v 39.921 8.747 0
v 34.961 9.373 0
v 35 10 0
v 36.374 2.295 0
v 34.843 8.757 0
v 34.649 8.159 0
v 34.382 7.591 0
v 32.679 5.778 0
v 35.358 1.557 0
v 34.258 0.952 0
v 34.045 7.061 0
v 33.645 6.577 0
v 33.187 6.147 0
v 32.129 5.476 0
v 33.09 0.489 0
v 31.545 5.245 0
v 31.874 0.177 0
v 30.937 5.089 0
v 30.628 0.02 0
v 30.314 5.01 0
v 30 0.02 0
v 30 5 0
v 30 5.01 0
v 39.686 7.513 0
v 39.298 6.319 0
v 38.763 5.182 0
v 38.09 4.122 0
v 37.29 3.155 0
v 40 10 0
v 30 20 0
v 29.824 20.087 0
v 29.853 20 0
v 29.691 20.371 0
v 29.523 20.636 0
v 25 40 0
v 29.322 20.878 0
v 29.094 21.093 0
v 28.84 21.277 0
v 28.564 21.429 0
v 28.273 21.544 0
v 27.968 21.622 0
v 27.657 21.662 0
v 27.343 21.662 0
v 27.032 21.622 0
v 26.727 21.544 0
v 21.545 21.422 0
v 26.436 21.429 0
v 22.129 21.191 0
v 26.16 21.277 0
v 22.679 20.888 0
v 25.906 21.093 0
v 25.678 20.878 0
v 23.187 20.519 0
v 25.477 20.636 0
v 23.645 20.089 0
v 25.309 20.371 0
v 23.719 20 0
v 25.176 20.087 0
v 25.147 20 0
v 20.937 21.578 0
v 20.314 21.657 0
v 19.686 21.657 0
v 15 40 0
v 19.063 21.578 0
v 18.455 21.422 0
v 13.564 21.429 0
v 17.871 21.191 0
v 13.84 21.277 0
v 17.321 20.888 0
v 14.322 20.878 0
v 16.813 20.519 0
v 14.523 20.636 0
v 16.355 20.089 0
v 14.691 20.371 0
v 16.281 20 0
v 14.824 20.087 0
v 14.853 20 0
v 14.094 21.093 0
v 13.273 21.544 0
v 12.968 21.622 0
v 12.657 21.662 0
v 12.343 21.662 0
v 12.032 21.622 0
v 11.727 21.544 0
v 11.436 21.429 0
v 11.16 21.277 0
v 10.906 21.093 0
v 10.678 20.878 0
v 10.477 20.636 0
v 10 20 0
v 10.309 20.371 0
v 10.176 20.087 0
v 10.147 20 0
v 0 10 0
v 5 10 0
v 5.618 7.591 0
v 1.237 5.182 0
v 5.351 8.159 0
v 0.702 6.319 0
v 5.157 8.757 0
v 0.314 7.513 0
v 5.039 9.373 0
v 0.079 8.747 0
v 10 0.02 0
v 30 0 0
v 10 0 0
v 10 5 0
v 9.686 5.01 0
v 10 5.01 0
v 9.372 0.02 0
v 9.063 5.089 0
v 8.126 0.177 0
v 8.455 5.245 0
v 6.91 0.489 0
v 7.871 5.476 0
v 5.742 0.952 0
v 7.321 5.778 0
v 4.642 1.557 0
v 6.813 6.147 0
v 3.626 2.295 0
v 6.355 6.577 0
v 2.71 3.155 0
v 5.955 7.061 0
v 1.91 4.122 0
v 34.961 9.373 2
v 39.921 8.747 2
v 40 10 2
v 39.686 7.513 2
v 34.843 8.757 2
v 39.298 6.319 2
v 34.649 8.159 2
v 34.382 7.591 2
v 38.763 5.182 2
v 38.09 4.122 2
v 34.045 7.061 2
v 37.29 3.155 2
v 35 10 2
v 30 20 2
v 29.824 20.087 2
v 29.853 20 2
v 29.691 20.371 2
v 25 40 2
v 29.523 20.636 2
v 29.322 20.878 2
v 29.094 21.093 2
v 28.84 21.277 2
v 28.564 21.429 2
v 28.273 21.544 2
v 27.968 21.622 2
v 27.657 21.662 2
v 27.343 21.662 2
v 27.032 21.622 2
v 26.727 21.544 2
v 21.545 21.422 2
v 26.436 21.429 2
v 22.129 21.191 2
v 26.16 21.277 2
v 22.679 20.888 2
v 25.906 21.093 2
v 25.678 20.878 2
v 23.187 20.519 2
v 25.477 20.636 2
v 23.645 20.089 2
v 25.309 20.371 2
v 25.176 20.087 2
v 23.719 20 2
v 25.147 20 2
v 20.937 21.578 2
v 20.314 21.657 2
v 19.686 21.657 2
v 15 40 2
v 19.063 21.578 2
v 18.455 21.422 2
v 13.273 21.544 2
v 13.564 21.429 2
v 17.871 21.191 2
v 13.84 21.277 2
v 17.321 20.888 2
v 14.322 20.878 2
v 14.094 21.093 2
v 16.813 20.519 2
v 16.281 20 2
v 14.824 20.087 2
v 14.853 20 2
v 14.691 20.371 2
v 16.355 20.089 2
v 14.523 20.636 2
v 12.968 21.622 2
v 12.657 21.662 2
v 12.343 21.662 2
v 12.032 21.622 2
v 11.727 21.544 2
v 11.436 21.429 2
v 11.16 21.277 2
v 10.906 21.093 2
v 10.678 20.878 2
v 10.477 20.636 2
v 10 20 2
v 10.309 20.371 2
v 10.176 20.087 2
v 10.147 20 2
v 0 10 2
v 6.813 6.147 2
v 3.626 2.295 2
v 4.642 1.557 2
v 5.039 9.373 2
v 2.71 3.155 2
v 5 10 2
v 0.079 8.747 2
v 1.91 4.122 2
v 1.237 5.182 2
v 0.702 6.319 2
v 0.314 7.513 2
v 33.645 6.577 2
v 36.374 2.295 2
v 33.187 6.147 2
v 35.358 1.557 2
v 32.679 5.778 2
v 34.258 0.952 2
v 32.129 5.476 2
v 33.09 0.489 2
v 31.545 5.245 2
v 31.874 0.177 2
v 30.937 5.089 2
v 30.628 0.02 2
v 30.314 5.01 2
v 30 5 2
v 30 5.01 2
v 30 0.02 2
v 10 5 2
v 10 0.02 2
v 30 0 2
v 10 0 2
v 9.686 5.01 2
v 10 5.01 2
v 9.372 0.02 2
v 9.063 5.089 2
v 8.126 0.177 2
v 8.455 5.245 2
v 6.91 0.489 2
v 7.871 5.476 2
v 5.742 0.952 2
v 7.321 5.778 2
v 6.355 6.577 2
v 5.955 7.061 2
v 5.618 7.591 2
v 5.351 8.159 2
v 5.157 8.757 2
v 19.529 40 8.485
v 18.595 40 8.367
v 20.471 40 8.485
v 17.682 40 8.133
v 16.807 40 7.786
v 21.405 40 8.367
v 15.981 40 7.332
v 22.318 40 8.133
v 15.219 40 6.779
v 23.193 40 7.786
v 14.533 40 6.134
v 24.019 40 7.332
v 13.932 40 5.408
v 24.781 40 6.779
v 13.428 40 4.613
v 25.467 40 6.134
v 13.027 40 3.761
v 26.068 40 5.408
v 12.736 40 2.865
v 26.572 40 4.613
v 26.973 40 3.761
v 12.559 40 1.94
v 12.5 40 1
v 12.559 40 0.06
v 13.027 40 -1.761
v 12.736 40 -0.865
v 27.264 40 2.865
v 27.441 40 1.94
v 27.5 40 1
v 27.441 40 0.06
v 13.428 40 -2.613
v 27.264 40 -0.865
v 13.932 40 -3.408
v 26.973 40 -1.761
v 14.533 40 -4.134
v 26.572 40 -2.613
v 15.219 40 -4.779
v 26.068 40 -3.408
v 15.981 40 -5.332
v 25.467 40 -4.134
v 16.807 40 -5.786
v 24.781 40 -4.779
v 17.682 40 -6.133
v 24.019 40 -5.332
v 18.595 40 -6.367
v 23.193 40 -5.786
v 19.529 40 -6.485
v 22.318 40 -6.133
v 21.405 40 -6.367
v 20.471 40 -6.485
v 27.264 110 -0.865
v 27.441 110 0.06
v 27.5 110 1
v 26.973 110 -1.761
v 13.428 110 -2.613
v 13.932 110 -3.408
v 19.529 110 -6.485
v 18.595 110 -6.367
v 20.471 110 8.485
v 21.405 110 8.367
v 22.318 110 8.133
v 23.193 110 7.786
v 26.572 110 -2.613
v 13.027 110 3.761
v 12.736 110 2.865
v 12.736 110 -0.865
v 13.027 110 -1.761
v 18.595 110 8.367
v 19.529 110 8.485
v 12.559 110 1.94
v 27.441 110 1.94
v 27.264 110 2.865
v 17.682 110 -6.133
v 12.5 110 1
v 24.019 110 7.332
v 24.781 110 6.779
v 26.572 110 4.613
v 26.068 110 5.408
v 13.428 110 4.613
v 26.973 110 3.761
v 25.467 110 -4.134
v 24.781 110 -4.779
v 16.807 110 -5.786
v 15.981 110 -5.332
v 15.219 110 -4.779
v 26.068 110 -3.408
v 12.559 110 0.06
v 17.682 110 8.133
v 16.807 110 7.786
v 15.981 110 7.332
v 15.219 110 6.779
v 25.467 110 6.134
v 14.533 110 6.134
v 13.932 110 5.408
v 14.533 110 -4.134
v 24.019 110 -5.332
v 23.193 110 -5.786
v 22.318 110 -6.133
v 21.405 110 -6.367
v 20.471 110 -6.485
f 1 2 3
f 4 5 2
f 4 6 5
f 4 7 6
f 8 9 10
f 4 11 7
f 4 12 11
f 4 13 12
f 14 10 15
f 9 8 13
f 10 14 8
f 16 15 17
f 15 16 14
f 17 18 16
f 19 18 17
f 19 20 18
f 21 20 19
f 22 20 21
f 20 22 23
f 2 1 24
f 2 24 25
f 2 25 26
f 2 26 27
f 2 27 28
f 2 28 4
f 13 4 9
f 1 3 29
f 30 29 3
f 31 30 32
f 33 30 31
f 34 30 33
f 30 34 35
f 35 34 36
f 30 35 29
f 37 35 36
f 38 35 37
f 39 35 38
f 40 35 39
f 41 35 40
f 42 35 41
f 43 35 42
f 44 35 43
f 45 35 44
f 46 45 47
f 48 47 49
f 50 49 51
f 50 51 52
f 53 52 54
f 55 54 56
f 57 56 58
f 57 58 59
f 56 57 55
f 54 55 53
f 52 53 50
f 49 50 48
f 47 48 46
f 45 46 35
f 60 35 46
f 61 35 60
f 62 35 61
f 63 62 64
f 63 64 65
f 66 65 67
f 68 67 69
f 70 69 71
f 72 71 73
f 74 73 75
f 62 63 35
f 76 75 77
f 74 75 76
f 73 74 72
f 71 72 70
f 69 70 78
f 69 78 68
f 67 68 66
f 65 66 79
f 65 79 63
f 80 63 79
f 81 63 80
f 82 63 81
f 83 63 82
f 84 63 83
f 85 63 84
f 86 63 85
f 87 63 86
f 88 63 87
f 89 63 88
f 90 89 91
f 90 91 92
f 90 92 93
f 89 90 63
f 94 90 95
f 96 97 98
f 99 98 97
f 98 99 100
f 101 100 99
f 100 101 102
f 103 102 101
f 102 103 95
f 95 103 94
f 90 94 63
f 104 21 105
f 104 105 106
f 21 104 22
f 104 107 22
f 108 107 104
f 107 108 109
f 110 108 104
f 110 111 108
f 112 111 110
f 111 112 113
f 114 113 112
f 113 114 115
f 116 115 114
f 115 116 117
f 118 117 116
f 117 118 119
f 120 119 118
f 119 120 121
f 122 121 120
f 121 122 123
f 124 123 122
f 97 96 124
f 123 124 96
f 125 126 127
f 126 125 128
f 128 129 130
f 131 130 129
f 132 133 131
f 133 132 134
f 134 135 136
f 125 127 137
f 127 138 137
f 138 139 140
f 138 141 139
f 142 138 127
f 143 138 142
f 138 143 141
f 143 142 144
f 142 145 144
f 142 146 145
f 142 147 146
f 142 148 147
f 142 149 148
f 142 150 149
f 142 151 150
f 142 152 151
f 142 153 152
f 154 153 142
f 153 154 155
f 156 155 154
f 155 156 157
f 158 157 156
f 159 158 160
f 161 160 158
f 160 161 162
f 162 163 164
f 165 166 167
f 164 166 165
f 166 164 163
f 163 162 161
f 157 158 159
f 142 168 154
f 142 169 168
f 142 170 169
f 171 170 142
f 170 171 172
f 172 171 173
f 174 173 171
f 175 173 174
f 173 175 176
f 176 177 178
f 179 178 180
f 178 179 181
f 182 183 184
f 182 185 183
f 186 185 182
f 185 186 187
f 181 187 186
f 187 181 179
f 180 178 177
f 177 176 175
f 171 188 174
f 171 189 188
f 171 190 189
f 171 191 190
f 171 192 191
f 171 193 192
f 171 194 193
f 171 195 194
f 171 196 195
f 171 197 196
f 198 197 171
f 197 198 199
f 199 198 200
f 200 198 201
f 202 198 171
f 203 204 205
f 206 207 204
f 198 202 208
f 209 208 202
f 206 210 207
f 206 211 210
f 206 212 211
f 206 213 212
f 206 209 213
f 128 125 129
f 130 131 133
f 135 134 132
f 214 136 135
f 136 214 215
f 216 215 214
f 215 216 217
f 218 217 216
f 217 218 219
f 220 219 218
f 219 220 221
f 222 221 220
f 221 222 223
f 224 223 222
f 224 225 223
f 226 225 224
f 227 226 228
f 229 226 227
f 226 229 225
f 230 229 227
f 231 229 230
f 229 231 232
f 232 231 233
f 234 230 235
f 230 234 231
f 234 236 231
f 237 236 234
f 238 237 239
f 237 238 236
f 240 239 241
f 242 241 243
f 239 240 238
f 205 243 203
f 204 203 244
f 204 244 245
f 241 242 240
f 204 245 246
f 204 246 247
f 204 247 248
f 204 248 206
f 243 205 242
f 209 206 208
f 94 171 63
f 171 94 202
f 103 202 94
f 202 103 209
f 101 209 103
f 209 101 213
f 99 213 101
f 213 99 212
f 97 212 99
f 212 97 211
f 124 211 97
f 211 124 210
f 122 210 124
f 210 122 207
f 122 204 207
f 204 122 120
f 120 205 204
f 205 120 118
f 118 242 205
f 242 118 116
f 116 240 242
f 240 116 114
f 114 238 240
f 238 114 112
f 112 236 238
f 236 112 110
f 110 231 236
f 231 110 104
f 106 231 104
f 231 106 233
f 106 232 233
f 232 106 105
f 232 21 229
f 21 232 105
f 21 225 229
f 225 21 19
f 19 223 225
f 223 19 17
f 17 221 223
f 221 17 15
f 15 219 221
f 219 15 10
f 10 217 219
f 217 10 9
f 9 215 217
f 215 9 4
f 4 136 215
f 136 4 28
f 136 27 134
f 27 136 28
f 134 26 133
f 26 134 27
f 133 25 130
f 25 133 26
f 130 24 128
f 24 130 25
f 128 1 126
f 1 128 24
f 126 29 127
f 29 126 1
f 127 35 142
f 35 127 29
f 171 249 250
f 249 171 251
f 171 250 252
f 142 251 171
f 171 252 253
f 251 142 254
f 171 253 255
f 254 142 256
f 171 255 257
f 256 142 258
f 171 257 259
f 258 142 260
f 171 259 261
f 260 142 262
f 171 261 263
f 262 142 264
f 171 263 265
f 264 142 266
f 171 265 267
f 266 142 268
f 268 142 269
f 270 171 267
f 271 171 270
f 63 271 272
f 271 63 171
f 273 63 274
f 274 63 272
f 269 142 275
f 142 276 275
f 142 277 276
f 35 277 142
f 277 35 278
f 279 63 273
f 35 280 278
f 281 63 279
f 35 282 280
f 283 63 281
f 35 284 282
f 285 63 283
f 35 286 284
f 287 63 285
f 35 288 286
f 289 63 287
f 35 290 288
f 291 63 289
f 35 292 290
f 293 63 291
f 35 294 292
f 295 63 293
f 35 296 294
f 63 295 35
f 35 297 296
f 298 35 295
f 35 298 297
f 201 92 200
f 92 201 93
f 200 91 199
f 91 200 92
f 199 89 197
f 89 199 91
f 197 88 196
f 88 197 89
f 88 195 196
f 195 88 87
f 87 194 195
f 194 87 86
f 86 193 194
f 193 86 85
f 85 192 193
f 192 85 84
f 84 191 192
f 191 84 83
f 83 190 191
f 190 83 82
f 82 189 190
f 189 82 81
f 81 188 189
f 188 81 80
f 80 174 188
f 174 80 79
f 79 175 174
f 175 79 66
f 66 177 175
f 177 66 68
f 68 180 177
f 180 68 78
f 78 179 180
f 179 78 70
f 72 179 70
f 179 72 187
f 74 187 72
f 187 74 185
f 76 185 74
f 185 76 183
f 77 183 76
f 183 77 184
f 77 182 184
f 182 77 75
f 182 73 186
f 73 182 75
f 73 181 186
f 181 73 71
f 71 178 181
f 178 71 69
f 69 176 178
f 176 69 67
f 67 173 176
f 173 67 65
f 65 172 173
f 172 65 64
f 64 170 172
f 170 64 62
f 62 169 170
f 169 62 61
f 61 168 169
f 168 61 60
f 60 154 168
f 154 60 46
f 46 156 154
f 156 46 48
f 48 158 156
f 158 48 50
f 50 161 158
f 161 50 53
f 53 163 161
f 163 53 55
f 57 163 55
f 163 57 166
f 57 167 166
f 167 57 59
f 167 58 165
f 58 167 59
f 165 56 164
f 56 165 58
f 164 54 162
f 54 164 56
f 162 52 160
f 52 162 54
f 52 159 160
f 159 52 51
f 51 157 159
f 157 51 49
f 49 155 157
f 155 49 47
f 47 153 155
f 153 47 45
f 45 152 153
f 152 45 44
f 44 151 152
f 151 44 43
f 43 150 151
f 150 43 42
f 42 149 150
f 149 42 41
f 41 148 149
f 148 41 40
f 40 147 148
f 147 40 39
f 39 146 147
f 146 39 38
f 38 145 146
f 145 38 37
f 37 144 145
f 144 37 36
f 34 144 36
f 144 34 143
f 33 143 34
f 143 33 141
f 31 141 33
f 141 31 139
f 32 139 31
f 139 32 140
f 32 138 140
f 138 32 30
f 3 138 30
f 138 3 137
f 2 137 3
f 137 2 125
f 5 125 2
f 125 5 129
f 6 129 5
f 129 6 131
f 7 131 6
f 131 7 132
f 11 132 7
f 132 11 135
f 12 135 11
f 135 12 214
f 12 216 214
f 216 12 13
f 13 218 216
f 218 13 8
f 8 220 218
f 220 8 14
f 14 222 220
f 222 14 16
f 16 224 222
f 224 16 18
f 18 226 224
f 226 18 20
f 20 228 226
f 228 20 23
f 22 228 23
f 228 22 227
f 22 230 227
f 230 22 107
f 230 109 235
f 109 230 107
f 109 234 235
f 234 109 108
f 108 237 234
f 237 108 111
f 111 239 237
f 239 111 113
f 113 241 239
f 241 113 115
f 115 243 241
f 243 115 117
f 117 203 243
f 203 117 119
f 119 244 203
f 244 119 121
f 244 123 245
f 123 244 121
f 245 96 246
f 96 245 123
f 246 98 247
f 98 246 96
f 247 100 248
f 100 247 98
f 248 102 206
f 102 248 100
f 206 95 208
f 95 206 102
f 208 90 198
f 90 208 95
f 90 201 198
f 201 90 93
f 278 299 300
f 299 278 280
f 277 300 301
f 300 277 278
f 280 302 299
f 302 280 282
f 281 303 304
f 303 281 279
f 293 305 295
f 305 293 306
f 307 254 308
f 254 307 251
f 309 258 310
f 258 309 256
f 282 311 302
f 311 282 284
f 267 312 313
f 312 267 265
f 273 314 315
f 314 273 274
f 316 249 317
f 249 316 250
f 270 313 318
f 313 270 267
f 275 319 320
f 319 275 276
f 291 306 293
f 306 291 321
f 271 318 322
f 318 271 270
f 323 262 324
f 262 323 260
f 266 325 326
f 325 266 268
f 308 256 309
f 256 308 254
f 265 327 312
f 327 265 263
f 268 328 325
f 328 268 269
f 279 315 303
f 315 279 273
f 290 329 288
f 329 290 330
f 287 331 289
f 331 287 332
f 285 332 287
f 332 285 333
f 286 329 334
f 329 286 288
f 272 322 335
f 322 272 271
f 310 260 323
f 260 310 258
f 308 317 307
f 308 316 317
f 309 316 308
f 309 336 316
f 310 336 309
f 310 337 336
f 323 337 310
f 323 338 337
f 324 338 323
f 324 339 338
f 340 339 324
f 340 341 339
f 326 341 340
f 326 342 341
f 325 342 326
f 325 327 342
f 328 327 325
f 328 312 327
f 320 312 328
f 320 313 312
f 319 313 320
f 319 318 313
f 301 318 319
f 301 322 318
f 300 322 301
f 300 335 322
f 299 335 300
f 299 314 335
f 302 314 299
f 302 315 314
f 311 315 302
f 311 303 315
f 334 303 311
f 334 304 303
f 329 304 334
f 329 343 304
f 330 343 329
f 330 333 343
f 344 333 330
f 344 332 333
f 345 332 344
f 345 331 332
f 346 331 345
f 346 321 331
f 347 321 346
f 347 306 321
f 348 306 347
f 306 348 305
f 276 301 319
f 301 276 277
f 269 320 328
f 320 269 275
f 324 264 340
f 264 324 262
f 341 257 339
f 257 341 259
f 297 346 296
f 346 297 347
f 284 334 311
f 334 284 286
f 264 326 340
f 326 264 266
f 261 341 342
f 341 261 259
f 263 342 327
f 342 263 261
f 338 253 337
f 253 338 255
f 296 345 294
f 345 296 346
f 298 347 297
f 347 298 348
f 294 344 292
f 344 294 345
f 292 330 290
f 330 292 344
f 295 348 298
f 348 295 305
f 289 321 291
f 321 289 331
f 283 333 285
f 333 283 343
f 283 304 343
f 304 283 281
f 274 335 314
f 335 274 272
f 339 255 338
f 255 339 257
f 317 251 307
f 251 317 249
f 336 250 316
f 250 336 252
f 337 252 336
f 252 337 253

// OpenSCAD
// Set the total width of the bottle opener
width = 40; //[30:50]
// Set the height of the opening
openingHeight = 15; //[5:30]
// Set the width of the openers frame
frameWidth = 5; //[3:10]
// Set the thickness of the frame of the opener
thickness = 2; //[2:10]
// Set the height of the neck of the opener
neckHeight = 20; //[15:30]
// Set the width of the neck of the opener
neckWidth = 10; //[5:15]
// Set the radius of the small cavity
smallPinCircle = 2.5; // 
// Set the height of the small cavity
smallPinLoc = 3; // 
// Set the radius of the big cavity
bigPinCircle = 5; //
// Set the height of the big cavity
bigPinLoc = 1.5; // 
// Set the radius of the grip
gripWidth = 7.5; // [5:15]
// Set the length of the grip
gripLength = 70; // [40:150]

/* [hidden] */

$fn = 50;

union()
{
	linear_extrude(height = thickness)
	union()
	{
		intersection()
		{
			difference()
			{
				translate([frameWidth*2,frameWidth*2,0])circle(frameWidth*2);
				translate([frameWidth*2,frameWidth*2,0])circle(frameWidth);
			}
			polygon(points = [ [0,0], [0, frameWidth*2], [frameWidth*2,frameWidth*2], [frameWidth*2,frameWidth], [frameWidth*2,0] ], paths = [[0,1,2,3,4]] );
		}
		polygon(points = [ [0,frameWidth*2], [frameWidth,frameWidth*2], [frameWidth*2,openingHeight+(frameWidth)], [frameWidth,openingHeight+(frameWidth)] ], paths = [[0,1,2,3]] );
		polygon(points = [ [frameWidth*2,0], [width-(frameWidth*2),0], [width-(frameWidth*2),frameWidth], [frameWidth*2,frameWidth] ], paths = [[0,1,2,3]] );
		intersection()
		{
			difference()
			{
				translate([width-frameWidth*2,frameWidth*2,0])circle(frameWidth*2);
				translate([width-frameWidth*2,frameWidth*2,0])circle(frameWidth);
			}
			polygon(points = [ [width,0], [width, frameWidth*2], [width-frameWidth*2,frameWidth*2], [width-frameWidth*2,frameWidth], [width-frameWidth*2,0] ], paths = [[0,1,2,3,4]] );
		}
		polygon(points = [ [width,frameWidth*2], [width-frameWidth,frameWidth*2], [width-frameWidth*2,openingHeight+(frameWidth)], [width-frameWidth,openingHeight+(frameWidth)] ], paths = [[0,1,2,3]] );
		difference()
		{
			polygon(points = [ [frameWidth,openingHeight+frameWidth], [width-frameWidth,openingHeight+frameWidth], [width/2+neckWidth/2,openingHeight+frameWidth+neckHeight], [width/2-neckWidth/2,openingHeight+frameWidth+neckHeight] ], paths = [[0,1,2,3]] );
			intersection()
			{
				translate([frameWidth*2+smallPinCircle,openingHeight+frameWidth-smallPinCircle/3,0])circle(smallPinCircle);
				polygon(points = [ [frameWidth,openingHeight+frameWidth], [width-frameWidth,openingHeight+frameWidth], [width/2+neckWidth/2,openingHeight+frameWidth+neckHeight], [width/2-neckWidth/2,openingHeight+frameWidth+neckHeight] ], paths = [[0,1,2,3]] );
			}
			intersection()
			{
				translate([width-frameWidth*2-smallPinCircle,openingHeight+frameWidth-smallPinCircle/smallPinLoc,0])circle(smallPinCircle);
				polygon(points = [ [frameWidth,openingHeight+frameWidth], [width-frameWidth,openingHeight+frameWidth], [width/2+neckWidth/2,openingHeight+frameWidth+neckHeight], [width/2-neckWidth/2,openingHeight+frameWidth+neckHeight] ], paths = [[0,1,2,3]] );
			}
			intersection()
			{
				translate([width/2,openingHeight+frameWidth-bigPinCircle/bigPinLoc,0])circle(bigPinCircle);
				polygon(points = [ [frameWidth,openingHeight+frameWidth], [width-frameWidth,openingHeight+frameWidth], [width/2+neckWidth/2,openingHeight+frameWidth+neckHeight], [width/2-neckWidth/2,openingHeight+frameWidth+neckHeight] ], paths = [[0,1,2,3]] );
			}
		}
	}
	translate([width/2,openingHeight+frameWidth+neckHeight,thickness/2])rotate(a=-90, v=[1,0,0])cylinder(h = gripLength, r = gripWidth);
}
